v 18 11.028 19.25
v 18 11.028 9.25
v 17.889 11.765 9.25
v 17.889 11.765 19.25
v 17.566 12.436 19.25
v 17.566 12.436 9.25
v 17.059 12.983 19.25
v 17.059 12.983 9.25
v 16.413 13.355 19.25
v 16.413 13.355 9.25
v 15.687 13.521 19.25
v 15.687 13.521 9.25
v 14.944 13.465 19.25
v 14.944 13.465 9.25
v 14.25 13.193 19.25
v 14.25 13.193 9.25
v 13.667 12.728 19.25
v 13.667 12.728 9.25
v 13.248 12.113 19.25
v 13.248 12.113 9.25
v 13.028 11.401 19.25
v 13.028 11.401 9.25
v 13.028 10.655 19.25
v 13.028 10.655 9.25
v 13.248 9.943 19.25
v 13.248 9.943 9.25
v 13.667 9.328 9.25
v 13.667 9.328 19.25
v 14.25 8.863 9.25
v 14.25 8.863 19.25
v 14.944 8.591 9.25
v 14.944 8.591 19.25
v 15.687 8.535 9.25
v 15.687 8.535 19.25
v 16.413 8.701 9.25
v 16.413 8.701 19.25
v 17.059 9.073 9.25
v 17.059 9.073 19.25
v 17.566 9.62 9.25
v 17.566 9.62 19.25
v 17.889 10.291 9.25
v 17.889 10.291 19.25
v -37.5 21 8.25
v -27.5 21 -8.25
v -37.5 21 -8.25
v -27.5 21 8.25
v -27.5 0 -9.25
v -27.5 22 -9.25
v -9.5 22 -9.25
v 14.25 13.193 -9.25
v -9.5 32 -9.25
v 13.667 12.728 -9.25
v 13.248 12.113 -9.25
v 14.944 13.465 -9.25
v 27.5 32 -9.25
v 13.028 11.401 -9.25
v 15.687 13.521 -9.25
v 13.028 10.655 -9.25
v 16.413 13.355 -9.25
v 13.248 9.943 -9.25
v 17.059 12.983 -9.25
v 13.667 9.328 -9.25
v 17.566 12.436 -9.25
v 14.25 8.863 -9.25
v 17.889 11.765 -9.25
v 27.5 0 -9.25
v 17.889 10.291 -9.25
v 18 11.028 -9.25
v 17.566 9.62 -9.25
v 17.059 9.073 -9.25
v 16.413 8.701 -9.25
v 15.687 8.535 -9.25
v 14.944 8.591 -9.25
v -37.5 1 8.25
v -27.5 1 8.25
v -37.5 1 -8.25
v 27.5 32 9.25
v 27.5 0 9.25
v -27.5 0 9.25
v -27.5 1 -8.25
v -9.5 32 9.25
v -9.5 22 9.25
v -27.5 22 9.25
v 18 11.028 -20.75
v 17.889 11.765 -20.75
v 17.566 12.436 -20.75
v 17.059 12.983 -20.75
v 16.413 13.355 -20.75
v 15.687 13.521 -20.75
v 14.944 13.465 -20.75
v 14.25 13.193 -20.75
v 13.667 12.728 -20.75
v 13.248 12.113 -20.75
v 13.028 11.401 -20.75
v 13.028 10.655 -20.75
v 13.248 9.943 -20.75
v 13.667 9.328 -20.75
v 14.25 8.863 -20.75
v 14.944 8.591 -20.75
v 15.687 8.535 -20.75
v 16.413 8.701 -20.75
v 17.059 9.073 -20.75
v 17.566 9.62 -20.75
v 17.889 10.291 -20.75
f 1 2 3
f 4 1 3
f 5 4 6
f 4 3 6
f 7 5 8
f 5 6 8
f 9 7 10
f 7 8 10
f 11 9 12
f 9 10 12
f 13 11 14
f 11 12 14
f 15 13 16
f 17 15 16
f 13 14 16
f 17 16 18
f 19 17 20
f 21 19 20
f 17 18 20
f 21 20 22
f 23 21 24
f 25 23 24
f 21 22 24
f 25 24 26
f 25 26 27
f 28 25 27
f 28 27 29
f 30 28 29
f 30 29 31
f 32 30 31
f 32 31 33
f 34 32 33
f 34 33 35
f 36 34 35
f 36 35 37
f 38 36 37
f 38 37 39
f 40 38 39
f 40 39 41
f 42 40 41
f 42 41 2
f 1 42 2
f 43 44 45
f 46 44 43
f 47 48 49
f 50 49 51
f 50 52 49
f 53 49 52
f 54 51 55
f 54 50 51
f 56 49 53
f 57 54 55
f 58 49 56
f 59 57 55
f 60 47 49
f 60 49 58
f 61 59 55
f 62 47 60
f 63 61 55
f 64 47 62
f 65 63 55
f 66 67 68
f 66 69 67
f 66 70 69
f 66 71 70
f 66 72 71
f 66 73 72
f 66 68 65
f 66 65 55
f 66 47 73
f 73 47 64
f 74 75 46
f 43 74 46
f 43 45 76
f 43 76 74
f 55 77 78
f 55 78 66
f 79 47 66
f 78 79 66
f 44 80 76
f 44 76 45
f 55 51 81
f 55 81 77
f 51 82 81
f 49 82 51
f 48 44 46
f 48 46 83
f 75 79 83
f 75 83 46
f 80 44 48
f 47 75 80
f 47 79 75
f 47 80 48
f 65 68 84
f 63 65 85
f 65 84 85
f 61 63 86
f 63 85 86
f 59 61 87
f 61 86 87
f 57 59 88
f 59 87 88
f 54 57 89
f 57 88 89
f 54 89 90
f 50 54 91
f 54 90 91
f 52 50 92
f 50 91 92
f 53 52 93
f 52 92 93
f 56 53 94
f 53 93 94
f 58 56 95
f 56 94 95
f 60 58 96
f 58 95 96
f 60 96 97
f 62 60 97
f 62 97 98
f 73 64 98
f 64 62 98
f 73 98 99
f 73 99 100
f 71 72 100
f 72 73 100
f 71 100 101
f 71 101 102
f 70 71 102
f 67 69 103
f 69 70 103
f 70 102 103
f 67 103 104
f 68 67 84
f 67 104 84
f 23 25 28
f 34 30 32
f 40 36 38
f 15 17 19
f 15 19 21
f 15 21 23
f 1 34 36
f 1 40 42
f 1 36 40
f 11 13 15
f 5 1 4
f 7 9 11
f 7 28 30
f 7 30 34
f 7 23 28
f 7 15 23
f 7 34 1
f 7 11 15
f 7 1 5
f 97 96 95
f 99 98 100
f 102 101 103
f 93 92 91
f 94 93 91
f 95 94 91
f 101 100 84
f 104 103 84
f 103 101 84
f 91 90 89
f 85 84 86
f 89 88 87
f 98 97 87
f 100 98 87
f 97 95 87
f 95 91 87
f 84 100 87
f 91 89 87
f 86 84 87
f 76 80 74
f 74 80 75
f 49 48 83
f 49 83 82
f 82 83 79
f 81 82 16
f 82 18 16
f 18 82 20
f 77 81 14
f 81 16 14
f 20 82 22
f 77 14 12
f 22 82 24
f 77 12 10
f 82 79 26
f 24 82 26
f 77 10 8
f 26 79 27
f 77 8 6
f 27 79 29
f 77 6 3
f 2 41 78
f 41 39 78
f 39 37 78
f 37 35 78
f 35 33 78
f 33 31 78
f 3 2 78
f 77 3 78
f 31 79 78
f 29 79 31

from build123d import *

# Parameters (mm, degrees)
SKETCH1_W                = 55
SKETCH1_H                = 18.5
BOSS_EXTRUDE1_DEPTH      = 22
SKETCH2_W                = 16.5
SKETCH2_H                = 20
BOSS_EXTRUDE2_DEPTH      = 10
BOSS_EXTRUDE3_DEPTH      = 10
BOSS_EXTRUDE3_DEPTH_BACK = 30
SKETCH5_R                = 2.5
SKETCH6_W                = 37
SKETCH6_H                = 18.5
BOSS_EXTRUDE4_DEPTH      = 10


with BuildPart() as part:
    # Sketch1 → Boss-Extrude1 (new body)
    with BuildSketch(Plane(origin=(0, 0, 0), x_dir=(1, 0, 0), z_dir=(0, 1, 0))):
        Rectangle(SKETCH1_W, SKETCH1_H)
    extrude(amount=BOSS_EXTRUDE1_DEPTH)

    # Sketch2 → Boss-Extrude2 (add)
    with BuildSketch(Plane.ZY.offset(27.5)):
        with Locations((0, 11)):
            Rectangle(SKETCH2_W, SKETCH2_H)
    extrude(amount=BOSS_EXTRUDE2_DEPTH)

    # Sketch5 → Boss-Extrude3 (add, two sides: drawn at the far end of the back side and taken through both)
    with BuildSketch(Plane.XY.offset(9.25).offset(-BOSS_EXTRUDE3_DEPTH_BACK)):
        with Locations((15.5, 11.027980953)):
            Circle(SKETCH5_R)
    extrude(amount=BOSS_EXTRUDE3_DEPTH + BOSS_EXTRUDE3_DEPTH_BACK)

    # Sketch6 → Boss-Extrude4 (add)
    with BuildSketch(Plane(origin=(0, 22, 0), x_dir=(1, 0, 0), z_dir=(0, 1, 0))):
        with Locations((9, 0)):
            Rectangle(SKETCH6_W, SKETCH6_H)
    extrude(amount=BOSS_EXTRUDE4_DEPTH)


solid = part.part
